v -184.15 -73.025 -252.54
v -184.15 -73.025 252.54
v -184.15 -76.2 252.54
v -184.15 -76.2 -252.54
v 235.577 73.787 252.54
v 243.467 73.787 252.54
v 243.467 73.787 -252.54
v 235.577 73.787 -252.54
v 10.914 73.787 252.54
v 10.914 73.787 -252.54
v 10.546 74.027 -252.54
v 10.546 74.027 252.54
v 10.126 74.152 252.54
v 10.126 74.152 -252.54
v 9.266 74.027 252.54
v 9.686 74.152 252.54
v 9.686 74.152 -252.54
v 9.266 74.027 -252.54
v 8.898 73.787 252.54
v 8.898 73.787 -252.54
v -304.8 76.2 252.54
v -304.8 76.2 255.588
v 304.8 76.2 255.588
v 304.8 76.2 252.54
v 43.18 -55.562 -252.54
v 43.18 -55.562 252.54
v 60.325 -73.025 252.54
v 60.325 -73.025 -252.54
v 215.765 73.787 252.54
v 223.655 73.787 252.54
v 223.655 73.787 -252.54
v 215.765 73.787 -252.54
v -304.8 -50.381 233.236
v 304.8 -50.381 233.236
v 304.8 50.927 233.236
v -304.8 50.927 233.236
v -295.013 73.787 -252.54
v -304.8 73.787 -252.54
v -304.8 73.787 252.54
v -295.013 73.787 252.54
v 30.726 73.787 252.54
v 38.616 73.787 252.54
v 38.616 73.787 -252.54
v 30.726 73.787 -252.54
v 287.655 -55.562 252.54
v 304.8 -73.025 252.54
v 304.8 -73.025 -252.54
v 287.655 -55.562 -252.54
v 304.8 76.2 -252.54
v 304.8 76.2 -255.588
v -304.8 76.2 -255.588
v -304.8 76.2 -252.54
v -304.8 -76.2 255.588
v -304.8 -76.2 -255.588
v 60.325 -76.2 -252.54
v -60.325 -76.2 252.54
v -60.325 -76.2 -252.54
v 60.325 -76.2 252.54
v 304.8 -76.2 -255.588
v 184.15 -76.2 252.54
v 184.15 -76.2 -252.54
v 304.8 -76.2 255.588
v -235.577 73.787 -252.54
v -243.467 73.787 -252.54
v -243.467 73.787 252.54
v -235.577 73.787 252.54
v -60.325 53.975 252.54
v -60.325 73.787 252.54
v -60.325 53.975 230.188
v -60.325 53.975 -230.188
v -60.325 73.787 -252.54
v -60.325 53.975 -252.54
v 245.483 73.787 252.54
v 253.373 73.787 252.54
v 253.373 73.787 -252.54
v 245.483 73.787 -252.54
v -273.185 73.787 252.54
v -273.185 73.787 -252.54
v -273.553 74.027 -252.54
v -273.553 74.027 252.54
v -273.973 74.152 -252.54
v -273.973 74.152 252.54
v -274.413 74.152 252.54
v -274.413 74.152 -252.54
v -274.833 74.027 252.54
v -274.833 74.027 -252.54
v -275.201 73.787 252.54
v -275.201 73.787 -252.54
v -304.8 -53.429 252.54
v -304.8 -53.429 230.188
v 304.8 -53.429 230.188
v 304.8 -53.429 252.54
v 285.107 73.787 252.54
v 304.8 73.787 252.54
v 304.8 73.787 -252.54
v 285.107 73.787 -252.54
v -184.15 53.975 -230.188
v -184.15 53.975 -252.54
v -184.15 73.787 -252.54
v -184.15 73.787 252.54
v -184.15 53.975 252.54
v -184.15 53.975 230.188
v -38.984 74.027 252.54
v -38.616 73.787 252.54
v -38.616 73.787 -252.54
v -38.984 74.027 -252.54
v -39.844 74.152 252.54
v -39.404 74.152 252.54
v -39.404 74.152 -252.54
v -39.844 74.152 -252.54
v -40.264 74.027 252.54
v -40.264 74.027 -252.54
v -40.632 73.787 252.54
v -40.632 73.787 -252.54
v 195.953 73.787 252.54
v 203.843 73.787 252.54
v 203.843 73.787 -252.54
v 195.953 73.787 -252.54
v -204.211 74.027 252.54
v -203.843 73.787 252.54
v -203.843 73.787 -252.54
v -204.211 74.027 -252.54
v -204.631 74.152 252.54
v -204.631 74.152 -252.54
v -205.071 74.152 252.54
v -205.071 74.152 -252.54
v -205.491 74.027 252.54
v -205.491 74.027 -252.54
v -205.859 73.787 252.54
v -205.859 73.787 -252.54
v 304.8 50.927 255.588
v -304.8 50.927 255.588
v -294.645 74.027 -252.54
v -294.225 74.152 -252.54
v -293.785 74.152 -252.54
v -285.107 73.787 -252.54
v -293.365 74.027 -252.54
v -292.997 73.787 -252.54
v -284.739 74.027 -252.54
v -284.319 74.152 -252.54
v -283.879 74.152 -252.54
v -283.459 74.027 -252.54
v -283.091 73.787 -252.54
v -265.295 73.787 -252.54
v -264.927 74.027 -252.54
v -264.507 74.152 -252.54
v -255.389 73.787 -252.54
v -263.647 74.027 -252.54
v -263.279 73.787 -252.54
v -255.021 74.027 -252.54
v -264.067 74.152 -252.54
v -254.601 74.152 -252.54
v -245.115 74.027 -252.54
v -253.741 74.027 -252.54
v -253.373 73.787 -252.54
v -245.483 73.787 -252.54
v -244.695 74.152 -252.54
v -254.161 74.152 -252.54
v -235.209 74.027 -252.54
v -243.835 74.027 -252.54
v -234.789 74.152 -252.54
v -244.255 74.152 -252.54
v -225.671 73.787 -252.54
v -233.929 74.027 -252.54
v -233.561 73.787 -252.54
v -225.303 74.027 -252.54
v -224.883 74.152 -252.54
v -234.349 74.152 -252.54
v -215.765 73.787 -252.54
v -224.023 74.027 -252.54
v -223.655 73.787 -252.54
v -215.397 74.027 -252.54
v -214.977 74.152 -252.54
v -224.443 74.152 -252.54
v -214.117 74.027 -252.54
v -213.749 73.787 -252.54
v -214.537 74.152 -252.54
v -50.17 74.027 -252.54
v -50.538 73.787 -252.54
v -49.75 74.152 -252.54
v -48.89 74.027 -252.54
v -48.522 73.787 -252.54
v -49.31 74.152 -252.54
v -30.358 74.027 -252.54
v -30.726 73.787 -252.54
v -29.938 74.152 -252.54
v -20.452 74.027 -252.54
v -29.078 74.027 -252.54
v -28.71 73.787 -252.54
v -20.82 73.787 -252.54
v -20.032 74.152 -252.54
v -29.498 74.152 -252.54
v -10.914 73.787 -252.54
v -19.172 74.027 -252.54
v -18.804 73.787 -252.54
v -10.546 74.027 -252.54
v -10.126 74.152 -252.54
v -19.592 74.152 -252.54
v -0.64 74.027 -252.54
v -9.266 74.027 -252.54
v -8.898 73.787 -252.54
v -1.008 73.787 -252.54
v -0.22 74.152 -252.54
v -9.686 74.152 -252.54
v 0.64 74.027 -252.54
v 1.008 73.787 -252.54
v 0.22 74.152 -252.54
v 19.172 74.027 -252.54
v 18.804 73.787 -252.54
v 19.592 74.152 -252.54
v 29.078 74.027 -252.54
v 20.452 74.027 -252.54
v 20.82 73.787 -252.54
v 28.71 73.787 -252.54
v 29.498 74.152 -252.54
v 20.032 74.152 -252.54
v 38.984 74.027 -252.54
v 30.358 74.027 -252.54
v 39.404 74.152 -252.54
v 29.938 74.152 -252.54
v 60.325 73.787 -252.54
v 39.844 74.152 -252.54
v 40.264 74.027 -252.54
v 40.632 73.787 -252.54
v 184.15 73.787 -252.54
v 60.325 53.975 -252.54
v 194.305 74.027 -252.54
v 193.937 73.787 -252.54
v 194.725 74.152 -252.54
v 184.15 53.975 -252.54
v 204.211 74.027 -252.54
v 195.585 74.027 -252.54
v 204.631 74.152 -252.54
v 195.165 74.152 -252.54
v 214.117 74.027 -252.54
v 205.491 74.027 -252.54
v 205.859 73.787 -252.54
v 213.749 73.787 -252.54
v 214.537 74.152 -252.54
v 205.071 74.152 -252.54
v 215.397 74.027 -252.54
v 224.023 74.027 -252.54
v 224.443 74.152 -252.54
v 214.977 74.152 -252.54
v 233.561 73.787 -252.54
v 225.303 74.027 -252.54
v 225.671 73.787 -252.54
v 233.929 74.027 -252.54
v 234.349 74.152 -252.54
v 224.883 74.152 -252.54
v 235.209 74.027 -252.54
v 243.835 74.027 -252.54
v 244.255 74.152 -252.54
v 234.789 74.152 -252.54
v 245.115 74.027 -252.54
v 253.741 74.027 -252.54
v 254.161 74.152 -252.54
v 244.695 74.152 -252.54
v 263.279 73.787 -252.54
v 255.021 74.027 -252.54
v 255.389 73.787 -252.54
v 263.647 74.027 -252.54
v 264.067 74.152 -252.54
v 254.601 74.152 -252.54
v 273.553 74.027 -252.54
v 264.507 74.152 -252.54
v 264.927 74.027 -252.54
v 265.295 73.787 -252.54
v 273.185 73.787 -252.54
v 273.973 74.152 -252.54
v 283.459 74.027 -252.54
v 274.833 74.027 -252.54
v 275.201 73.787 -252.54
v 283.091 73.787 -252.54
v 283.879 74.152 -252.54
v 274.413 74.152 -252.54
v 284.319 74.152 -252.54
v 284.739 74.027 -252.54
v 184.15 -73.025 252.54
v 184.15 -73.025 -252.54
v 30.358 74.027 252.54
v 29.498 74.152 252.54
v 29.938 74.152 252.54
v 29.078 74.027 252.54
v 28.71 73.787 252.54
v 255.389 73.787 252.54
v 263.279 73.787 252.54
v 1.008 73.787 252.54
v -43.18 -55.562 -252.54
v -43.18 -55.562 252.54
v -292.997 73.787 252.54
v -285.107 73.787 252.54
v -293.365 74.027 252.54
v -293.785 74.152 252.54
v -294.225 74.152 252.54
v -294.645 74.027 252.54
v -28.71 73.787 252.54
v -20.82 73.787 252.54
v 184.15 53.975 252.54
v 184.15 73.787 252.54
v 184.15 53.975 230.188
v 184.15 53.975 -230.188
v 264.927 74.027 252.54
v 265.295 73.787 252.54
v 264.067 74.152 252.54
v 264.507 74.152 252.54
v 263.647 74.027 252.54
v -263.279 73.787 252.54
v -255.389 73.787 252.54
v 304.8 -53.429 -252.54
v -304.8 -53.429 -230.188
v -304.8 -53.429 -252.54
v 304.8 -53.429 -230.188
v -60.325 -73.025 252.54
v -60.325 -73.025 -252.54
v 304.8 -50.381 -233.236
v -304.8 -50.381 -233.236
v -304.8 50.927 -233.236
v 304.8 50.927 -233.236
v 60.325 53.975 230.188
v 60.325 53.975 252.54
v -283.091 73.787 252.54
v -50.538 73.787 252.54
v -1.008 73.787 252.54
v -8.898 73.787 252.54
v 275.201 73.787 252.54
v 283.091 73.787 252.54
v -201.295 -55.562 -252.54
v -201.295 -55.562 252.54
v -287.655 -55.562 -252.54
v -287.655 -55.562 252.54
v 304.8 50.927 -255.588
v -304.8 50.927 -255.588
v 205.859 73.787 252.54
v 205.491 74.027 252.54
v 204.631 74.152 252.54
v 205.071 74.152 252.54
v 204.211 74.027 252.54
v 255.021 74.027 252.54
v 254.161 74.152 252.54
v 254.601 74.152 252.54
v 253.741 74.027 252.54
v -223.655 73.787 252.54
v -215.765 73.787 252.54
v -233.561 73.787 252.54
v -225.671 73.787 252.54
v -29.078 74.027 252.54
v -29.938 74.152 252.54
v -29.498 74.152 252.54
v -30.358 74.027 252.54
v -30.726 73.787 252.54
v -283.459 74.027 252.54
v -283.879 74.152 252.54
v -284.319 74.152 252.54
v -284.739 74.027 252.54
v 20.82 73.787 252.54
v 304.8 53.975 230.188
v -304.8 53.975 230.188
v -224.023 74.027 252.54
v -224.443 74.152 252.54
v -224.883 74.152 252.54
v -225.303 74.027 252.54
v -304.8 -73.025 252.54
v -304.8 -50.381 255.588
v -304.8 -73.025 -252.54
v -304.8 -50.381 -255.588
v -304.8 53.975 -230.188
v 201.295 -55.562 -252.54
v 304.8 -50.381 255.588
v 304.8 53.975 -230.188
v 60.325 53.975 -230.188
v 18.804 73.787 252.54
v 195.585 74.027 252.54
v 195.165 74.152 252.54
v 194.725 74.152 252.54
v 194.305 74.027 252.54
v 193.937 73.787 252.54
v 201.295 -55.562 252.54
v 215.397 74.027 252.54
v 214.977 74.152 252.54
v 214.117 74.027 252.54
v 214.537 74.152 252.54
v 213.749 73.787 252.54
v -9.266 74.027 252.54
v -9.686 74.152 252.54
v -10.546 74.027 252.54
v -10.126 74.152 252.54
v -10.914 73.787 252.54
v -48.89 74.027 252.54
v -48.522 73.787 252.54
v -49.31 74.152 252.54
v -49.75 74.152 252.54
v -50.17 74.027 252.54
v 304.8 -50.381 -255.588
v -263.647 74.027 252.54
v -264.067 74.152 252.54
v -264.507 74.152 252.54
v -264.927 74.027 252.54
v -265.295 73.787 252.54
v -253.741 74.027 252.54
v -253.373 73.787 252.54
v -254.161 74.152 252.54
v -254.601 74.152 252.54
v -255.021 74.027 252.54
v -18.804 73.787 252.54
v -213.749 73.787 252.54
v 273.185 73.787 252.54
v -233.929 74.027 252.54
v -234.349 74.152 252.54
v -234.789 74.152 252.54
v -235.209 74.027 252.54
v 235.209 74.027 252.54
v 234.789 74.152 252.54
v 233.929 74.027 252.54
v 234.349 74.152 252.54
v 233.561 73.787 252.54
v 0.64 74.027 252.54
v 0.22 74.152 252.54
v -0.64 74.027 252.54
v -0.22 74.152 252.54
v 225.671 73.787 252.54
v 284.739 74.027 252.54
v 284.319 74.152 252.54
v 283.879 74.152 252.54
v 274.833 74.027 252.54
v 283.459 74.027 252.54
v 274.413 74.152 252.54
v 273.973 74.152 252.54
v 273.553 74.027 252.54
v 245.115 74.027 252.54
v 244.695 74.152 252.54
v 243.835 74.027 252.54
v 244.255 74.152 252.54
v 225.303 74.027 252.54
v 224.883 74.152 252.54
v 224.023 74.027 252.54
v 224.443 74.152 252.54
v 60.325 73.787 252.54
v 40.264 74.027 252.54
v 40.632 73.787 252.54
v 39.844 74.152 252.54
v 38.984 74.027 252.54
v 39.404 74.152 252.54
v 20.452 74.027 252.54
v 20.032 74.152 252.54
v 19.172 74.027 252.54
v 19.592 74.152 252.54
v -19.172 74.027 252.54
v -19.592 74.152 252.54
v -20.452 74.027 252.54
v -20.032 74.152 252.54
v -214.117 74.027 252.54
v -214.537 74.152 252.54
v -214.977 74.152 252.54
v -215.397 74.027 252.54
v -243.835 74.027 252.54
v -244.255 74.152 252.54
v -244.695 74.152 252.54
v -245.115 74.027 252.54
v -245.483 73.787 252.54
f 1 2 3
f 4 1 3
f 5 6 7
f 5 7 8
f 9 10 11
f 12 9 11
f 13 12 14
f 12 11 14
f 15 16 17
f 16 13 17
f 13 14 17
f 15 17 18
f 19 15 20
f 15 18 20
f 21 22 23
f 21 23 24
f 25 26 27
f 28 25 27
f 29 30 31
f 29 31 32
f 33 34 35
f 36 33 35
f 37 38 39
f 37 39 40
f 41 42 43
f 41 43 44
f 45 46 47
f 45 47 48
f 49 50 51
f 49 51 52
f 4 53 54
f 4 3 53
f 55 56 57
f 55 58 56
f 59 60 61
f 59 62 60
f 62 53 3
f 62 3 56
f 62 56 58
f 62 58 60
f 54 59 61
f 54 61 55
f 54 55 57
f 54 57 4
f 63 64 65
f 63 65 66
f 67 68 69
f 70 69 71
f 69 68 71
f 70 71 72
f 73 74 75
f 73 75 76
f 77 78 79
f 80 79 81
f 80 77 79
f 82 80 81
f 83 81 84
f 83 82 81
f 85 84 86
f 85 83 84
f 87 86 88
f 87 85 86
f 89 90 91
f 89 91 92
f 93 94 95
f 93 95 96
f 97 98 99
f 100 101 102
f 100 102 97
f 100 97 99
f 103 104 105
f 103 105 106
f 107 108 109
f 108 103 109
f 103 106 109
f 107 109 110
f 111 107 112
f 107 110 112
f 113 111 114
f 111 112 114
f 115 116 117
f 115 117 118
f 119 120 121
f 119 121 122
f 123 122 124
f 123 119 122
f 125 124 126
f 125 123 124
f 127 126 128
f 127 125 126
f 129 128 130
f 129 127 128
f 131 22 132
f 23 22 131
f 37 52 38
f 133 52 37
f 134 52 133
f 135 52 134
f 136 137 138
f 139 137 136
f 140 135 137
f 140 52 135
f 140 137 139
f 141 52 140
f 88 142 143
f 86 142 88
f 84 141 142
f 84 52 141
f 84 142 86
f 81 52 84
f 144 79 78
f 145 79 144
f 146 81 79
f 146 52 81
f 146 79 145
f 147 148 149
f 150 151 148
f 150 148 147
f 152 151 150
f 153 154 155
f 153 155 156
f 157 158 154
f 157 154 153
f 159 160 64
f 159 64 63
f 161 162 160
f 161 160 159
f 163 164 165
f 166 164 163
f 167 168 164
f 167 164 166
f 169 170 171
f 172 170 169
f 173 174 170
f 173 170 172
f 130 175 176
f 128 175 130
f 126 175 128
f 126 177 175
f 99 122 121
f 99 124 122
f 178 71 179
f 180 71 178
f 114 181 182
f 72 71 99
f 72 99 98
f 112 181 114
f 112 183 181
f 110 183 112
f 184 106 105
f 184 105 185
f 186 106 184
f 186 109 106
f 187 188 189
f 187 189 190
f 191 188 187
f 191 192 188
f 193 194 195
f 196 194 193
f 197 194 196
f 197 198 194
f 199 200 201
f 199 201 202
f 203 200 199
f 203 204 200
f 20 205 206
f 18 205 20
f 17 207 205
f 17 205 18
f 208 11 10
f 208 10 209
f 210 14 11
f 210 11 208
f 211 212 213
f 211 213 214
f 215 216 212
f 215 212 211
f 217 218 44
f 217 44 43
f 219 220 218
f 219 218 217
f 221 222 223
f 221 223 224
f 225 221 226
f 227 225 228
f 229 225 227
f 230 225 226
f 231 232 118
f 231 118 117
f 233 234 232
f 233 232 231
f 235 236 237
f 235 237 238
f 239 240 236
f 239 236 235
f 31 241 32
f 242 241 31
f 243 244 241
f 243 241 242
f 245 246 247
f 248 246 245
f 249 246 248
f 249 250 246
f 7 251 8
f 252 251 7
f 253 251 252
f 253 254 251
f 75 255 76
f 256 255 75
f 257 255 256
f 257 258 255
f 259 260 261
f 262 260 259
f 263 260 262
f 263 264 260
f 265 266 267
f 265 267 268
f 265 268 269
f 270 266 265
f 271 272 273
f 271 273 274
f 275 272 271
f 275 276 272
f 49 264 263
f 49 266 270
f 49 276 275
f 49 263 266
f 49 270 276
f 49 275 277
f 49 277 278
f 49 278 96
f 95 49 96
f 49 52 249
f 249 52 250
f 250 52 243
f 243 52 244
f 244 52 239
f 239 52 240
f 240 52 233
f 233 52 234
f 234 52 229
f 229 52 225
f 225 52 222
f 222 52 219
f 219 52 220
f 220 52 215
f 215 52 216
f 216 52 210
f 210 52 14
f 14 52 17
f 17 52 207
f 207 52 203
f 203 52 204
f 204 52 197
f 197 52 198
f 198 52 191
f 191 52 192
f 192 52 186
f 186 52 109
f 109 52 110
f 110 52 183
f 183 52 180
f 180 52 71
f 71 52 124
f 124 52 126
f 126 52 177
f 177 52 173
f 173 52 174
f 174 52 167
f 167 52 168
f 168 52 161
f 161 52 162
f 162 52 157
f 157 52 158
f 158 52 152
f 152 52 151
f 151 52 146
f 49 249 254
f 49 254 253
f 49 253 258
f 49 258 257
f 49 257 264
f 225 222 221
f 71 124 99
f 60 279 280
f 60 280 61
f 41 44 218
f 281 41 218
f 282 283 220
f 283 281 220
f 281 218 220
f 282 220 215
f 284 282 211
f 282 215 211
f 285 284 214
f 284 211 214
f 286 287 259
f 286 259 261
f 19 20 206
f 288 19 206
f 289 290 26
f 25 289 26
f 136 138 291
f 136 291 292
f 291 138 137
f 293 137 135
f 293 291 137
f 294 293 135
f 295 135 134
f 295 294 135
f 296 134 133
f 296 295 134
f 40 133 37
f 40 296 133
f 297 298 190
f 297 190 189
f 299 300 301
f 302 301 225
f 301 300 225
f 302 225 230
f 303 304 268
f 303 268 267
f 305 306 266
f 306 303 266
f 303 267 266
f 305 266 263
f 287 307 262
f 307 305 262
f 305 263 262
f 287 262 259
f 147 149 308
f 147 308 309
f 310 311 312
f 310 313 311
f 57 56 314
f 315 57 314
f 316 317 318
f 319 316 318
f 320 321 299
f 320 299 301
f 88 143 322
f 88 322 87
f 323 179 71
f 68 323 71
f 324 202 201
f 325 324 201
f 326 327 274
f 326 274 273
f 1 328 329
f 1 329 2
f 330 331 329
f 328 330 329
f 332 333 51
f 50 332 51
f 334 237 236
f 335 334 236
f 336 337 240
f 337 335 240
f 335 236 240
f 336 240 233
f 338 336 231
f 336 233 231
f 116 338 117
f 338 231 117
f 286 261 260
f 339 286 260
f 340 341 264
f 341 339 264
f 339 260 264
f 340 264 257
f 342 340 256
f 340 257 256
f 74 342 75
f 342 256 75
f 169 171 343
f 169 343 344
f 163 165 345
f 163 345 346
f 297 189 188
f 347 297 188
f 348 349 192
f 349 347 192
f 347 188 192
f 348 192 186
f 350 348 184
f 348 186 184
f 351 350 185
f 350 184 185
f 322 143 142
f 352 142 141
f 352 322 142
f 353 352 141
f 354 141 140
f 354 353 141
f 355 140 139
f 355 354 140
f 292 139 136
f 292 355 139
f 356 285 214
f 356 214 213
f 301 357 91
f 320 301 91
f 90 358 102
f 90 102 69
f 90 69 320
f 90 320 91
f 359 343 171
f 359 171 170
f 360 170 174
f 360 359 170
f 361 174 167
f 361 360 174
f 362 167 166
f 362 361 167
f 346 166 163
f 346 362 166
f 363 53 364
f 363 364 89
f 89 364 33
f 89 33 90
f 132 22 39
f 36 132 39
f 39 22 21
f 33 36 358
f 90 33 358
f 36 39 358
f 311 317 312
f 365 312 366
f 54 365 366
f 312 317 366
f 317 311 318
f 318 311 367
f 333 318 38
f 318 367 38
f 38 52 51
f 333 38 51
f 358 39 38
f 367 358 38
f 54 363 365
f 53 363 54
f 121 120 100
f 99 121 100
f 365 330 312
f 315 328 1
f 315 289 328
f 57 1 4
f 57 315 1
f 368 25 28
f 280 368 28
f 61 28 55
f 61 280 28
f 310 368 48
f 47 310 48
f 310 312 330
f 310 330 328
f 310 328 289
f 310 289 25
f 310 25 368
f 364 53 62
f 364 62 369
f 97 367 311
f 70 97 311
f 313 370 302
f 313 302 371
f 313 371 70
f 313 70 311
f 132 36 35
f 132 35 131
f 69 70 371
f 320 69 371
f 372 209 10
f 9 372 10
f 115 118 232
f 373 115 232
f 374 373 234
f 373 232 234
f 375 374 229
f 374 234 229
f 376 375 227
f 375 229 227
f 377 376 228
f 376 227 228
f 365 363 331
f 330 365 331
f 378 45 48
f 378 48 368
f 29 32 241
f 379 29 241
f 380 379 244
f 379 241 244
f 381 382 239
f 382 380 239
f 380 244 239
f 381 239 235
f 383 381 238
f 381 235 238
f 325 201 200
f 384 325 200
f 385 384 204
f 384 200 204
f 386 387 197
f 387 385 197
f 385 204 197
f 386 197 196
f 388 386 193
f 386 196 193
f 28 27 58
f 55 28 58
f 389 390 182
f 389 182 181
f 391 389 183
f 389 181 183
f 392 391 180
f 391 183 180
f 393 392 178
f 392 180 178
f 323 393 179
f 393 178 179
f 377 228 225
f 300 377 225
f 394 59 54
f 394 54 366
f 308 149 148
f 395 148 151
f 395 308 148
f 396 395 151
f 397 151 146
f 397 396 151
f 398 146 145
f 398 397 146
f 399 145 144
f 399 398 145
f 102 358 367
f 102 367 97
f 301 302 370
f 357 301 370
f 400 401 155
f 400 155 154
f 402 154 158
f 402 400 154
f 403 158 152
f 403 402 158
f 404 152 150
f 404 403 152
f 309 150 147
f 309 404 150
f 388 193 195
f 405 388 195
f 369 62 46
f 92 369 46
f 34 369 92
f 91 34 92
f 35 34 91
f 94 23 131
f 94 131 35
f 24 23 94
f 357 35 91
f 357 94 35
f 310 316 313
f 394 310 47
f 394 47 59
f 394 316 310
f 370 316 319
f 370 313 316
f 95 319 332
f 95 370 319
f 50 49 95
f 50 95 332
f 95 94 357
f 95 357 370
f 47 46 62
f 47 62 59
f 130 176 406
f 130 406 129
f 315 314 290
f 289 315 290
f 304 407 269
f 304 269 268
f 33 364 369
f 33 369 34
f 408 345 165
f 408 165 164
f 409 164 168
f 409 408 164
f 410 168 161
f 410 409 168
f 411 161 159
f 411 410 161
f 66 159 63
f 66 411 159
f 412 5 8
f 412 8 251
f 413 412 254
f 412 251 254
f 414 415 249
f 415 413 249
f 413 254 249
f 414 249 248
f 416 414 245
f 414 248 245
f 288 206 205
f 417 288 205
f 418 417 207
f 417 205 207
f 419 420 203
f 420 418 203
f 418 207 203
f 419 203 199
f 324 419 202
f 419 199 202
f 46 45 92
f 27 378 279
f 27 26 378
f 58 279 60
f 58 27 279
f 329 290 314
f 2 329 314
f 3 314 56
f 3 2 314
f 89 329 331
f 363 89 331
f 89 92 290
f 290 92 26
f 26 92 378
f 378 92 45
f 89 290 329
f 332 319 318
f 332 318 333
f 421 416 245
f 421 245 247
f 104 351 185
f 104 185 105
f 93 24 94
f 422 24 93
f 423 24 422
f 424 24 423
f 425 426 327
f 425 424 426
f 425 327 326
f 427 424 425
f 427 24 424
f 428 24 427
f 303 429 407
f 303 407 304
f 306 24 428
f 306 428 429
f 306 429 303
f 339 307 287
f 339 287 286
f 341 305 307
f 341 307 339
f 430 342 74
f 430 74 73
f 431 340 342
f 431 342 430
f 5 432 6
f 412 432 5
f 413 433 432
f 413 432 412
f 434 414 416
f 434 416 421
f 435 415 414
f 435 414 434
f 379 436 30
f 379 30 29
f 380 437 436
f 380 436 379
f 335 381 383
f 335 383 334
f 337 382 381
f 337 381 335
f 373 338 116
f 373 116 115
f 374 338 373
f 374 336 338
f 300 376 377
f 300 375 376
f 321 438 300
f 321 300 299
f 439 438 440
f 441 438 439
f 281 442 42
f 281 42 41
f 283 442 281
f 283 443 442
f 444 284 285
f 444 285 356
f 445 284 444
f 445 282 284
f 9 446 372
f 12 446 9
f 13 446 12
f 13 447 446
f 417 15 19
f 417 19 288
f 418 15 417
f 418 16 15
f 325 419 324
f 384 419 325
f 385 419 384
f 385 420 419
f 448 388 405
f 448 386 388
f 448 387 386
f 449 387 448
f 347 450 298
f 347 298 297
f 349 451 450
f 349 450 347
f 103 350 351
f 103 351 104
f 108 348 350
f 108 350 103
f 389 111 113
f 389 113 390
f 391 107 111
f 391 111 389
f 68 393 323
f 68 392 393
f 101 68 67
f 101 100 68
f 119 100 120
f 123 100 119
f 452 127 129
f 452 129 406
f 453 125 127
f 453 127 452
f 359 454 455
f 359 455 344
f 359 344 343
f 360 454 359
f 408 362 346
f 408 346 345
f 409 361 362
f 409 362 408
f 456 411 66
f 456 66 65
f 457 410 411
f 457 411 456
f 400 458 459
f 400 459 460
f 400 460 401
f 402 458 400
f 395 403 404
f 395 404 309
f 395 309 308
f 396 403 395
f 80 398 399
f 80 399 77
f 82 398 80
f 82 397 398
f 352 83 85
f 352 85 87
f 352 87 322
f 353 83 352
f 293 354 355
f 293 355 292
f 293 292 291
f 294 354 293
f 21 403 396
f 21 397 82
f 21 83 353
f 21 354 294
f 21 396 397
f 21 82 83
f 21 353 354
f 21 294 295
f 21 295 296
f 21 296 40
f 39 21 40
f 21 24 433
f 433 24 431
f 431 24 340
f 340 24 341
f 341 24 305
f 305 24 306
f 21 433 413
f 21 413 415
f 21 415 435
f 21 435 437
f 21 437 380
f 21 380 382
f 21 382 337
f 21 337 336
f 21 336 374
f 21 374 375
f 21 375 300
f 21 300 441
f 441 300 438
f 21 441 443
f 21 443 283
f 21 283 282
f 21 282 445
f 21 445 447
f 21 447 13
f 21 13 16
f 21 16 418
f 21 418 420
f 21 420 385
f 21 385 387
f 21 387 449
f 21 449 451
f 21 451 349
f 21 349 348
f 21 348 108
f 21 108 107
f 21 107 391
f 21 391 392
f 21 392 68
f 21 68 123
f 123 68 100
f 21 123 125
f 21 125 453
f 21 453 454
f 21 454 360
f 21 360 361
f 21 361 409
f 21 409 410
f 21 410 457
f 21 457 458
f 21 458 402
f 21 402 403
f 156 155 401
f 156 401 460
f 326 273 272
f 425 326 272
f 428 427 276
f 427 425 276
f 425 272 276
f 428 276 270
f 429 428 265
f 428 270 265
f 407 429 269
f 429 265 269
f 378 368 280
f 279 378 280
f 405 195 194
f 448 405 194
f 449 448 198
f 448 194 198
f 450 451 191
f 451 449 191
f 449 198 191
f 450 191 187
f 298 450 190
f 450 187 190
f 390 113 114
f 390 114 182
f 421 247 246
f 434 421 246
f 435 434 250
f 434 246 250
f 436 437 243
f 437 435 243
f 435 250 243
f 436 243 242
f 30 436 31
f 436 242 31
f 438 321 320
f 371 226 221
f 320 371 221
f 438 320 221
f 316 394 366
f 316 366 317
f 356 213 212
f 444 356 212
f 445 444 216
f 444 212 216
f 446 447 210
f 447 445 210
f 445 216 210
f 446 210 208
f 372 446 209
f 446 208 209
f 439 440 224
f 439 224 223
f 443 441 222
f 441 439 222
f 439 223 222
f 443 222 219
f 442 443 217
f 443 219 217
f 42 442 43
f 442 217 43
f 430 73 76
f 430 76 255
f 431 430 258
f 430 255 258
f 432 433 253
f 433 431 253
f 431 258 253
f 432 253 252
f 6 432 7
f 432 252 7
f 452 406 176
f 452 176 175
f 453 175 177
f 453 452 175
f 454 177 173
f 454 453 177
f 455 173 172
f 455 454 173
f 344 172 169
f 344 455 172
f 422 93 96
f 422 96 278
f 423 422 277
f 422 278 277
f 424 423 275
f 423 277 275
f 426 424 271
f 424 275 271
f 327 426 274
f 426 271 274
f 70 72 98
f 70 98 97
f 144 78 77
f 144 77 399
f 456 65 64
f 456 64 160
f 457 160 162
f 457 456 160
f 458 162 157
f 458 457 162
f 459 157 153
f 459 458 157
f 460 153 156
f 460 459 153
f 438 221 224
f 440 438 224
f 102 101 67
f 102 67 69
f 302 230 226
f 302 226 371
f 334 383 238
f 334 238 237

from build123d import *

# Parameters (mm, degrees)
BOSS_EXTRUDE1_DEPTH   = 255.5875
BOSS_EXTRUDE1_2_DEPTH = 255.5875
BOSS_EXTRUDE1_3_DEPTH = 255.5875
SKETCH4_W             = 120.65
SKETCH4_H             = 19.812
BOSS_EXTRUDE2_DEPTH   = 255.5875
SKETCH5_R             = 1.524
BOSS_EXTRUDE3_DEPTH   = 511.175
SKETCH_PATTERN1_START = -255.5875
SKETCH_PATTERN1_DEPTH = 511.175
BOSS_EXTRUDE4_DEPTH   = 304.8


# Read off the part's stored shape, not the designer's step: Sketch-Pattern1
with BuildPart() as part:
    # Sketch3 → Boss-Extrude1 (new, symmetric)
    with BuildSketch(Plane.XY):
        Polygon((-304.8, -76.2), (-304.8, -73.025), (-287.655, -55.5625), (-201.295, -55.5625), (-184.15, -73.025), (-184.15, -76.2), align=None)
    extrude(amount=BOSS_EXTRUDE1_DEPTH, both=True)



with BuildPart() as body_2:
    # Sketch3 → Boss-Extrude1 2 (new, symmetric)
    with BuildSketch(Plane.XY):
        Polygon((184.15, -73.025), (184.15, -76.2), (304.8, -76.2), (304.8, -73.025), (287.655, -55.5625), (201.295, -55.5625), align=None)
    extrude(amount=BOSS_EXTRUDE1_2_DEPTH, both=True)


with BuildPart() as body_3:
    # Sketch3 → Boss-Extrude1 3 (new, symmetric)
    with BuildSketch(Plane.XY):
        Polygon((-43.18, -55.5625), (43.18, -55.5625), (60.325, -73.025), (60.325, -76.2), (-60.325, -76.2), (-60.325, -73.025), align=None)
    extrude(amount=BOSS_EXTRUDE1_3_DEPTH, both=True)


with BuildPart() as body_4:
    # Sketch4 → Boss-Extrude2 (new, symmetric)
    with BuildSketch(Plane.XY):
        with Locations((-244.475, 63.881)):
            Rectangle(SKETCH4_W, SKETCH4_H)
    extrude(amount=BOSS_EXTRUDE2_DEPTH, both=True)

    # Sketch5 → Boss-Extrude3 (add)
    with BuildSketch(Plane.XY.offset(255.5875)):
        with Locations((-294.005, 72.644)):
            Circle(SKETCH5_R)
        with Locations((-284.099, 72.644)):
            Circle(SKETCH5_R)
        with Locations((-274.193, 72.644)):
            Circle(SKETCH5_R)
        with Locations((-264.287, 72.644)):
            Circle(SKETCH5_R)
        with Locations((-254.381, 72.644)):
            Circle(SKETCH5_R)
        with Locations((-244.475, 72.644)):
            Circle(SKETCH5_R)
        with Locations((-234.569, 72.644)):
            Circle(SKETCH5_R)
        with Locations((-224.663, 72.644)):
            Circle(SKETCH5_R)
        with Locations((-214.757, 72.644)):
            Circle(SKETCH5_R)
        with Locations((-204.851, 72.644)):
            Circle(SKETCH5_R)
    extrude(amount=-BOSS_EXTRUDE3_DEPTH)


with BuildPart() as body_5:
    # Sketch-Pattern1 outline → Sketch-Pattern1 (new body)
    with BuildSketch(Plane.XY.offset(SKETCH_PATTERN1_START)):
        with BuildLine():
            Line((60.325, 73.787), (40.63203125, 73.787))
            ThreePointArc((40.63203125, 73.787), (39.624, 74.168), (38.61596875, 73.787))
            Line((38.61596875, 73.787), (30.72603125, 73.787))
            ThreePointArc((30.72603125, 73.787), (29.718, 74.168), (28.70996875, 73.787))
            Line((28.70996875, 73.787), (20.82003125, 73.787))
            ThreePointArc((20.82003125, 73.787), (19.812, 74.168), (18.80396875, 73.787))
            Line((18.80396875, 73.787), (10.91403125, 73.787))
            ThreePointArc((10.91403125, 73.787), (9.906, 74.168), (8.89796875, 73.787))
            Line((8.89796875, 73.787), (1.00803125, 73.787))
            ThreePointArc((1.00803125, 73.787), (0, 74.168), (-1.00803125, 73.787))
            Line((-1.00803125, 73.787), (-8.89796875, 73.787))
            ThreePointArc((-8.89796875, 73.787), (-9.906, 74.168), (-10.91403125, 73.787))
            Line((-10.91403125, 73.787), (-18.80396875, 73.787))
            ThreePointArc((-18.80396875, 73.787), (-19.812, 74.168), (-20.82003125, 73.787))
            Line((-20.82003125, 73.787), (-28.70996875, 73.787))
            ThreePointArc((-28.70996875, 73.787), (-29.718, 74.168), (-30.72603125, 73.787))
            Line((-30.72603125, 73.787), (-38.61596875, 73.787))
            ThreePointArc((-38.61596875, 73.787), (-39.624, 74.168), (-40.63203125, 73.787))
            Line((-40.63203125, 73.787), (-48.52196875, 73.787))
            ThreePointArc((-48.52196875, 73.787), (-49.53, 74.168), (-50.53803125, 73.787))
            Line((-50.53803125, 73.787), (-60.325, 73.787))
            Line((-60.325, 73.787), (-60.325, 53.975))
            Line((-60.325, 53.975), (60.325, 53.975))
            Line((60.325, 53.975), (60.325, 73.787))
        make_face()
        with BuildLine():
            Line((304.8, 73.787), (285.10703125, 73.787))
            ThreePointArc((285.10703125, 73.787), (284.099, 74.168), (283.09096875, 73.787))
            Line((283.09096875, 73.787), (275.20103125, 73.787))
            ThreePointArc((275.20103125, 73.787), (274.193, 74.168), (273.18496875, 73.787))
            Line((273.18496875, 73.787), (265.29503125, 73.787))
            ThreePointArc((265.29503125, 73.787), (264.287, 74.168), (263.27896875, 73.787))
            Line((263.27896875, 73.787), (255.38903125, 73.787))
            ThreePointArc((255.38903125, 73.787), (254.381, 74.168), (253.37296875, 73.787))
            Line((253.37296875, 73.787), (245.48303125, 73.787))
            ThreePointArc((245.48303125, 73.787), (244.475, 74.168), (243.46696875, 73.787))
            Line((243.46696875, 73.787), (235.57703125, 73.787))
            ThreePointArc((235.57703125, 73.787), (234.569, 74.168), (233.56096875, 73.787))
            Line((233.56096875, 73.787), (225.67103125, 73.787))
            ThreePointArc((225.67103125, 73.787), (224.663, 74.168), (223.65496875, 73.787))
            Line((223.65496875, 73.787), (215.76503125, 73.787))
            ThreePointArc((215.76503125, 73.787), (214.757, 74.168), (213.74896875, 73.787))
            Line((213.74896875, 73.787), (205.85903125, 73.787))
            ThreePointArc((205.85903125, 73.787), (204.851, 74.168), (203.84296875, 73.787))
            Line((203.84296875, 73.787), (195.95303125, 73.787))
            ThreePointArc((195.95303125, 73.787), (194.945, 74.168), (193.93696875, 73.787))
            Line((193.93696875, 73.787), (184.15, 73.787))
            Line((184.15, 73.787), (184.15, 53.975))
            Line((184.15, 53.975), (304.8, 53.975))
            Line((304.8, 53.975), (304.8, 73.787))
        make_face()
    extrude(amount=SKETCH_PATTERN1_DEPTH)


with BuildPart() as part_1:
    add(part.part)

    add(body_2.part)  # Boss-Extrude4 merges body 2

    add(body_3.part)  # Boss-Extrude4 merges body 3

    add(body_4.part)  # Boss-Extrude4 merges body 4

    add(body_5.part)  # Boss-Extrude4 merges body 5
    # Sketch8 → Boss-Extrude4 (add, symmetric)
    with BuildSketch(Plane(origin=(0, 0, 0), x_dir=(0, 0, -1), z_dir=(1, 0, 0))):
        Polygon((-255.5875, -76.2), (-255.5875, -50.3809), (-233.2355, -50.3809), (-233.2355, 50.927), (-255.5875, 50.927), (-255.5875, 76.2), (-252.5395, 76.2), (-252.5395, 53.975), (-230.1875, 53.975), (-230.1875, -53.4289), (-252.5395, -53.4289), (-252.5395, -76.2), align=None)
        Polygon((252.5395, -53.4289), (252.5395, -76.2), (255.5875, -76.2), (255.5875, -50.3809), (233.2355, -50.3809), (233.2355, 50.927), (255.5875, 50.927), (255.5875, 76.2), (252.5395, 76.2), (252.5395, 53.975), (230.1875, 53.975), (230.1875, -53.4289), align=None)
    extrude(amount=BOSS_EXTRUDE4_DEPTH, both=True)


solid = part_1.part
